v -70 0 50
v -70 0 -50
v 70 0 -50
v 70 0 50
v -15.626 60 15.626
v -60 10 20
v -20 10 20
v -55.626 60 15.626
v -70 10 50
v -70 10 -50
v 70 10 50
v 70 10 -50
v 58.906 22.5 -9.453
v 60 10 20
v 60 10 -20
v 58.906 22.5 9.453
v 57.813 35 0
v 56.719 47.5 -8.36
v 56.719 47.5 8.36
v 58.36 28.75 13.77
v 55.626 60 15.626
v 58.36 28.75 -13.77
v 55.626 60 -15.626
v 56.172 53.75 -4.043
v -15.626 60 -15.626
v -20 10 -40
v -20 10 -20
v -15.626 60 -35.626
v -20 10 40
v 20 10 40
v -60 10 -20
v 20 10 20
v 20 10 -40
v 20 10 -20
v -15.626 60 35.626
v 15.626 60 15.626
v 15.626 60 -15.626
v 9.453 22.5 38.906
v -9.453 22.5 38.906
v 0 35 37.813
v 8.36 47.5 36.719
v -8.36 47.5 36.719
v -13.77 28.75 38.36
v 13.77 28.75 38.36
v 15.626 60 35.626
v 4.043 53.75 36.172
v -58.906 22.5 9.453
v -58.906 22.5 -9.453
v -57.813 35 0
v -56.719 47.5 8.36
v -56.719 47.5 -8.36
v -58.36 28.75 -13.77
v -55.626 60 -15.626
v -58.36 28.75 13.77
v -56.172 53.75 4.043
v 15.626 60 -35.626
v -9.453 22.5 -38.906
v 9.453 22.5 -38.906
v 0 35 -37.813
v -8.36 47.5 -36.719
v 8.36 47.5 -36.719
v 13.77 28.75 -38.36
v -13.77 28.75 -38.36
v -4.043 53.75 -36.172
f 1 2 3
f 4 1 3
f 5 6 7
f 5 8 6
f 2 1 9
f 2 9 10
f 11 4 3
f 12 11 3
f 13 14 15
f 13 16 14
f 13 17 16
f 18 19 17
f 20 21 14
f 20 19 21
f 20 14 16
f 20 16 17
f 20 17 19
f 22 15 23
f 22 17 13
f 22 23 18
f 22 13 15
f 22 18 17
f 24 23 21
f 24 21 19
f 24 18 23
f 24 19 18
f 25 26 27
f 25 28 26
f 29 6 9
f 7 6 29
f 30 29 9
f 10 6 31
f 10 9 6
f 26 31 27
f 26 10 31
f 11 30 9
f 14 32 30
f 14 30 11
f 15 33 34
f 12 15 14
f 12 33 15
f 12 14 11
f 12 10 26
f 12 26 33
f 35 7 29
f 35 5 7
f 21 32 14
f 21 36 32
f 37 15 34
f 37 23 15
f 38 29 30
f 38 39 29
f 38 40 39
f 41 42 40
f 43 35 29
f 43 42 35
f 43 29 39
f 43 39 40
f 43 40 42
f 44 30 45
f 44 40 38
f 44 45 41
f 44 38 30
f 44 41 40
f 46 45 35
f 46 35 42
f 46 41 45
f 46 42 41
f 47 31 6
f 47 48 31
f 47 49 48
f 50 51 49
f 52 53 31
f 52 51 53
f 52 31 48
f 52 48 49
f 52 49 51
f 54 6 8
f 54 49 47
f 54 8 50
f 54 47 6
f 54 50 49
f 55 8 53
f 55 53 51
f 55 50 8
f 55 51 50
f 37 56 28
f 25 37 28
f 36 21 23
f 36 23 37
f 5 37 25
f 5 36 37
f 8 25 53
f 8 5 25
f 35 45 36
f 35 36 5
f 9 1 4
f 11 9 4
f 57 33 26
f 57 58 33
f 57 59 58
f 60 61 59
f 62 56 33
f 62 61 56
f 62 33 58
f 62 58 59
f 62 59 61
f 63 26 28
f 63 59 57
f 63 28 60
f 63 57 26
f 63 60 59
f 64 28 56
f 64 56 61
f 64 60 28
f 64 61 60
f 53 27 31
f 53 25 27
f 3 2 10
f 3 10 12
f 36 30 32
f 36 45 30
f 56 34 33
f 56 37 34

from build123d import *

# Parameters (mm, degrees)
SKETCH_1_W      = 140
SKETCH_1_H      = 100
EXTRUDE_1_DEPTH = 10
EXTRUDE_2_DEPTH = 50
EXTRUDE_2_TAPER = 5


with BuildPart() as part:
    # 스케치1 → 보스-돌출1 (new body)
    with BuildSketch(Plane(origin=(0, 0, 0), x_dir=(1, 0, 0), z_dir=(0, 1, 0))):
        Rectangle(SKETCH_1_W, SKETCH_1_H)
    extrude(amount=EXTRUDE_1_DEPTH)

    # 스케치2 → 보스-돌출2 (add)
    with BuildSketch(Plane(origin=(0, 10, 0), x_dir=(1, 0, 0), z_dir=(0, 1, 0))):
        Polygon((20, 20), (20, 40), (-20, 40), (-20, 20), (-60, 20), (-60, -20), (-20, -20), (-20, -40), (20, -40), (20, -20), (60, -20), (60, 20), align=None)
    extrude(amount=EXTRUDE_2_DEPTH, taper=EXTRUDE_2_TAPER)


solid = part.part
